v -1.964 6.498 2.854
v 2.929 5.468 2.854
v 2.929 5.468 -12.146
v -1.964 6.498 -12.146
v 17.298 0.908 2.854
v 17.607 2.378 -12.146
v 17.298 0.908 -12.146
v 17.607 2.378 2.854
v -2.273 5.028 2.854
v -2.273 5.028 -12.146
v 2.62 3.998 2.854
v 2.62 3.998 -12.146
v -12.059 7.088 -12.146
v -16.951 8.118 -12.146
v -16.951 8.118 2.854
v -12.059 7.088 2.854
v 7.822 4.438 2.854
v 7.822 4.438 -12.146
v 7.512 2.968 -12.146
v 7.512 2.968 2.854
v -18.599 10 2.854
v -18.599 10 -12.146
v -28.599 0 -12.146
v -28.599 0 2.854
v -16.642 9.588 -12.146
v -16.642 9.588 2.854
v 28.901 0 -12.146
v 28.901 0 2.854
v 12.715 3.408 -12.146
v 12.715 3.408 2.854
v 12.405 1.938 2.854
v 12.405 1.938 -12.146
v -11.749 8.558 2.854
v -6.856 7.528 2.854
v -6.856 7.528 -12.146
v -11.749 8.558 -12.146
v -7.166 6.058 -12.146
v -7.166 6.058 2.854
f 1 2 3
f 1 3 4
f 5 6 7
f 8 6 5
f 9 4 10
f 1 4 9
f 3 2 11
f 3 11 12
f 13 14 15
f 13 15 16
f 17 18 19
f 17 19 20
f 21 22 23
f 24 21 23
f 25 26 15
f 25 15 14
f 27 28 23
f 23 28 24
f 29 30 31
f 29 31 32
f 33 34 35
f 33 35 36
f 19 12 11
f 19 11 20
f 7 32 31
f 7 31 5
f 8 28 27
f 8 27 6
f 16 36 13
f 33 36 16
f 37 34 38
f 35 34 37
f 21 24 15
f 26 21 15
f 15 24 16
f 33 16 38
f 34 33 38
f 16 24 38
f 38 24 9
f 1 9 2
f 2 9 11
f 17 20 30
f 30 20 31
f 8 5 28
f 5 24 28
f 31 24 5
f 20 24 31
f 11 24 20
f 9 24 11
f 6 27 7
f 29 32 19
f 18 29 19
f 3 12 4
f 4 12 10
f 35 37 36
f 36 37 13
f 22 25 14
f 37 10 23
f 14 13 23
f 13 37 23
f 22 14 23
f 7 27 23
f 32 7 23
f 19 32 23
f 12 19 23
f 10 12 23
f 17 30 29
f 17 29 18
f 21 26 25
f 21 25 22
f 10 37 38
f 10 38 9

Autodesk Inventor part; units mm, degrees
ref_plane "YZ Plane" through (0, 0, 0) normal (1, 0, 0) x (0, 1, 0)
ref_plane "XZ Plane" through (0, 0, 0) normal (0, 1, 0) x (-1, 0, 0)
ref_plane "XY Plane" through (0, 0, 0) normal (0, 0, 1) x (1, 0, 0)
sketch "Skizze1" plane through (0, 0, 0) normal (0, 1, 0) x (-1, 0, 0)
  line L0 (18.599, 2.8535) -> (-28.901, 2.8535)
  line L1 (-28.901, 2.8535) -> (-28.901, -12.1465)
  line L2 (-28.901, -12.1465) -> (18.599, -12.1465)
  line L3 (18.599, -12.1465) -> (18.599, 2.8535)
  line L4 (18.599, -12.1465) -> (28.599, -12.1465)
  line L5 (28.599, -12.1465) -> (28.599, 2.8535)
  line L6 (28.599, 2.8535) -> (18.599, 2.8535)
  line L7 (18.599, 2.8535) -> (18.599, -12.1465)
  point P0 (0, 0)
  dimension "d0" = 47.5
  dimension "d1" = 15
  dimension "d6" = 10
extrude "Extrusion1" add sketch "Skizze1" along normal blind 10 contours L3 L2 L1 L0
sketch "Skizze2" plane through (-18.599, 0, 2.8535) normal (0, 0, 1) x (1, 0, 0)
  line L0 (47.5, 10) -> (0, 10) projected
  line L1 (47.5, 0) -> (0, 10)
  line L2 (0, 10) -> (47.5, 10)
  line L3 (47.5, 10) -> (47.5, 0)
  point P0 (18.599, 0)
extrude "Extrusion2" cut sketch "Skizze2" against normal up to surface (15 mm away)
sketch "Skizze3" plane through (28.901, 0, 2.8535) normal (0.206, 0.9785, 0) x (0.9785, -0.206, 0)
  point P0 (-28.2811, 2.8535)
extrude "Extrusion3" add sketch "Skizze1" along normal blind 10 contours L6 L5 L4 L3
sketch "Skizze6" plane through (-28.599, 0, 2.8535) normal (0, 0, 1) x (1, 0, 0)
  line L0 (10, 10) -> (0, 10) projected
  line L1 (0, 0) -> (0, 10) projected
  line L2 (10, 10) -> (0, 0)
  line L3 (0, 0) -> (0, 10)
  line L4 (57.5, 0) -> (10, 10) projected
  line L5 (0, 10) -> (10, 10)
  point P0 (28.599, 0)
extrude "Extrusion4" cut sketch "Skizze6" against normal blind 15
sketch "Skizze7" plane through (28.901, 0, 2.8535) normal (0.206, 0.9785, 0) x (0.9785, -0.206, 0)
  line L0 (0, 15) -> (-56.2666, 15) projected
  line L1 (-56.2666, 0) -> (0, 0) projected
  line L2 (-46.5412, 15) -> (-41.5412, 15)
  line L3 (-41.5412, 15) -> (-41.5412, 0)
  line L4 (-41.5412, 0) -> (-46.5412, 0)
  line L5 (-46.5412, 0) -> (-46.5412, 15)
  line L6 (-48.5412, 15) -> (-48.5412, 0) projected
  line L7 (-31.5412, 15) -> (-31.5412, 0)
  line L8 (-36.5412, 15) -> (-31.5412, 15)
  line L9 (-36.5412, 0) -> (-36.5412, 15)
  line L10 (-31.5412, 0) -> (-36.5412, 0)
  line L11 (-21.5412, 15) -> (-21.5412, 0)
  line L12 (-26.5412, 15) -> (-21.5412, 15)
  line L13 (-26.5412, 0) -> (-26.5412, 15)
  line L14 (-21.5412, 0) -> (-26.5412, 0)
  line L15 (-11.5412, 15) -> (-11.5412, 0)
  line L16 (-16.5412, 15) -> (-11.5412, 15)
  line L17 (-16.5412, 0) -> (-16.5412, 15)
  line L18 (-11.5412, 0) -> (-16.5412, 0)
  point P0 (-28.2811, 2.8535)
  point P1 (-16.5412, 15)
  point P2 (-16.5412, 0)
  point P3 (-11.5412, 0)
  point P4 (-11.5412, 15)
  point P5 (-26.5412, 0)
  point P6 (-21.5412, 0)
  point P7 (-21.5412, 15)
  point P8 (-36.5412, 0)
  point P9 (-31.5412, 0)
  point P10 (-31.5412, 15)
  point P11 (-46.5412, 0)
  point P12 (-41.5412, 15)
  dimension "d11" = 5
  dimension "d12" = 2
  dimension "d15" = 10
extrude "Extrusion5" cut sketch "Skizze7" against normal blind 1.5 contours L15 L1 L17 L0 | L11 L1 L13 L0 | L7 L1 L9 L0 | L3 L1 L5 L0
properties part number "Keilvertsell"
